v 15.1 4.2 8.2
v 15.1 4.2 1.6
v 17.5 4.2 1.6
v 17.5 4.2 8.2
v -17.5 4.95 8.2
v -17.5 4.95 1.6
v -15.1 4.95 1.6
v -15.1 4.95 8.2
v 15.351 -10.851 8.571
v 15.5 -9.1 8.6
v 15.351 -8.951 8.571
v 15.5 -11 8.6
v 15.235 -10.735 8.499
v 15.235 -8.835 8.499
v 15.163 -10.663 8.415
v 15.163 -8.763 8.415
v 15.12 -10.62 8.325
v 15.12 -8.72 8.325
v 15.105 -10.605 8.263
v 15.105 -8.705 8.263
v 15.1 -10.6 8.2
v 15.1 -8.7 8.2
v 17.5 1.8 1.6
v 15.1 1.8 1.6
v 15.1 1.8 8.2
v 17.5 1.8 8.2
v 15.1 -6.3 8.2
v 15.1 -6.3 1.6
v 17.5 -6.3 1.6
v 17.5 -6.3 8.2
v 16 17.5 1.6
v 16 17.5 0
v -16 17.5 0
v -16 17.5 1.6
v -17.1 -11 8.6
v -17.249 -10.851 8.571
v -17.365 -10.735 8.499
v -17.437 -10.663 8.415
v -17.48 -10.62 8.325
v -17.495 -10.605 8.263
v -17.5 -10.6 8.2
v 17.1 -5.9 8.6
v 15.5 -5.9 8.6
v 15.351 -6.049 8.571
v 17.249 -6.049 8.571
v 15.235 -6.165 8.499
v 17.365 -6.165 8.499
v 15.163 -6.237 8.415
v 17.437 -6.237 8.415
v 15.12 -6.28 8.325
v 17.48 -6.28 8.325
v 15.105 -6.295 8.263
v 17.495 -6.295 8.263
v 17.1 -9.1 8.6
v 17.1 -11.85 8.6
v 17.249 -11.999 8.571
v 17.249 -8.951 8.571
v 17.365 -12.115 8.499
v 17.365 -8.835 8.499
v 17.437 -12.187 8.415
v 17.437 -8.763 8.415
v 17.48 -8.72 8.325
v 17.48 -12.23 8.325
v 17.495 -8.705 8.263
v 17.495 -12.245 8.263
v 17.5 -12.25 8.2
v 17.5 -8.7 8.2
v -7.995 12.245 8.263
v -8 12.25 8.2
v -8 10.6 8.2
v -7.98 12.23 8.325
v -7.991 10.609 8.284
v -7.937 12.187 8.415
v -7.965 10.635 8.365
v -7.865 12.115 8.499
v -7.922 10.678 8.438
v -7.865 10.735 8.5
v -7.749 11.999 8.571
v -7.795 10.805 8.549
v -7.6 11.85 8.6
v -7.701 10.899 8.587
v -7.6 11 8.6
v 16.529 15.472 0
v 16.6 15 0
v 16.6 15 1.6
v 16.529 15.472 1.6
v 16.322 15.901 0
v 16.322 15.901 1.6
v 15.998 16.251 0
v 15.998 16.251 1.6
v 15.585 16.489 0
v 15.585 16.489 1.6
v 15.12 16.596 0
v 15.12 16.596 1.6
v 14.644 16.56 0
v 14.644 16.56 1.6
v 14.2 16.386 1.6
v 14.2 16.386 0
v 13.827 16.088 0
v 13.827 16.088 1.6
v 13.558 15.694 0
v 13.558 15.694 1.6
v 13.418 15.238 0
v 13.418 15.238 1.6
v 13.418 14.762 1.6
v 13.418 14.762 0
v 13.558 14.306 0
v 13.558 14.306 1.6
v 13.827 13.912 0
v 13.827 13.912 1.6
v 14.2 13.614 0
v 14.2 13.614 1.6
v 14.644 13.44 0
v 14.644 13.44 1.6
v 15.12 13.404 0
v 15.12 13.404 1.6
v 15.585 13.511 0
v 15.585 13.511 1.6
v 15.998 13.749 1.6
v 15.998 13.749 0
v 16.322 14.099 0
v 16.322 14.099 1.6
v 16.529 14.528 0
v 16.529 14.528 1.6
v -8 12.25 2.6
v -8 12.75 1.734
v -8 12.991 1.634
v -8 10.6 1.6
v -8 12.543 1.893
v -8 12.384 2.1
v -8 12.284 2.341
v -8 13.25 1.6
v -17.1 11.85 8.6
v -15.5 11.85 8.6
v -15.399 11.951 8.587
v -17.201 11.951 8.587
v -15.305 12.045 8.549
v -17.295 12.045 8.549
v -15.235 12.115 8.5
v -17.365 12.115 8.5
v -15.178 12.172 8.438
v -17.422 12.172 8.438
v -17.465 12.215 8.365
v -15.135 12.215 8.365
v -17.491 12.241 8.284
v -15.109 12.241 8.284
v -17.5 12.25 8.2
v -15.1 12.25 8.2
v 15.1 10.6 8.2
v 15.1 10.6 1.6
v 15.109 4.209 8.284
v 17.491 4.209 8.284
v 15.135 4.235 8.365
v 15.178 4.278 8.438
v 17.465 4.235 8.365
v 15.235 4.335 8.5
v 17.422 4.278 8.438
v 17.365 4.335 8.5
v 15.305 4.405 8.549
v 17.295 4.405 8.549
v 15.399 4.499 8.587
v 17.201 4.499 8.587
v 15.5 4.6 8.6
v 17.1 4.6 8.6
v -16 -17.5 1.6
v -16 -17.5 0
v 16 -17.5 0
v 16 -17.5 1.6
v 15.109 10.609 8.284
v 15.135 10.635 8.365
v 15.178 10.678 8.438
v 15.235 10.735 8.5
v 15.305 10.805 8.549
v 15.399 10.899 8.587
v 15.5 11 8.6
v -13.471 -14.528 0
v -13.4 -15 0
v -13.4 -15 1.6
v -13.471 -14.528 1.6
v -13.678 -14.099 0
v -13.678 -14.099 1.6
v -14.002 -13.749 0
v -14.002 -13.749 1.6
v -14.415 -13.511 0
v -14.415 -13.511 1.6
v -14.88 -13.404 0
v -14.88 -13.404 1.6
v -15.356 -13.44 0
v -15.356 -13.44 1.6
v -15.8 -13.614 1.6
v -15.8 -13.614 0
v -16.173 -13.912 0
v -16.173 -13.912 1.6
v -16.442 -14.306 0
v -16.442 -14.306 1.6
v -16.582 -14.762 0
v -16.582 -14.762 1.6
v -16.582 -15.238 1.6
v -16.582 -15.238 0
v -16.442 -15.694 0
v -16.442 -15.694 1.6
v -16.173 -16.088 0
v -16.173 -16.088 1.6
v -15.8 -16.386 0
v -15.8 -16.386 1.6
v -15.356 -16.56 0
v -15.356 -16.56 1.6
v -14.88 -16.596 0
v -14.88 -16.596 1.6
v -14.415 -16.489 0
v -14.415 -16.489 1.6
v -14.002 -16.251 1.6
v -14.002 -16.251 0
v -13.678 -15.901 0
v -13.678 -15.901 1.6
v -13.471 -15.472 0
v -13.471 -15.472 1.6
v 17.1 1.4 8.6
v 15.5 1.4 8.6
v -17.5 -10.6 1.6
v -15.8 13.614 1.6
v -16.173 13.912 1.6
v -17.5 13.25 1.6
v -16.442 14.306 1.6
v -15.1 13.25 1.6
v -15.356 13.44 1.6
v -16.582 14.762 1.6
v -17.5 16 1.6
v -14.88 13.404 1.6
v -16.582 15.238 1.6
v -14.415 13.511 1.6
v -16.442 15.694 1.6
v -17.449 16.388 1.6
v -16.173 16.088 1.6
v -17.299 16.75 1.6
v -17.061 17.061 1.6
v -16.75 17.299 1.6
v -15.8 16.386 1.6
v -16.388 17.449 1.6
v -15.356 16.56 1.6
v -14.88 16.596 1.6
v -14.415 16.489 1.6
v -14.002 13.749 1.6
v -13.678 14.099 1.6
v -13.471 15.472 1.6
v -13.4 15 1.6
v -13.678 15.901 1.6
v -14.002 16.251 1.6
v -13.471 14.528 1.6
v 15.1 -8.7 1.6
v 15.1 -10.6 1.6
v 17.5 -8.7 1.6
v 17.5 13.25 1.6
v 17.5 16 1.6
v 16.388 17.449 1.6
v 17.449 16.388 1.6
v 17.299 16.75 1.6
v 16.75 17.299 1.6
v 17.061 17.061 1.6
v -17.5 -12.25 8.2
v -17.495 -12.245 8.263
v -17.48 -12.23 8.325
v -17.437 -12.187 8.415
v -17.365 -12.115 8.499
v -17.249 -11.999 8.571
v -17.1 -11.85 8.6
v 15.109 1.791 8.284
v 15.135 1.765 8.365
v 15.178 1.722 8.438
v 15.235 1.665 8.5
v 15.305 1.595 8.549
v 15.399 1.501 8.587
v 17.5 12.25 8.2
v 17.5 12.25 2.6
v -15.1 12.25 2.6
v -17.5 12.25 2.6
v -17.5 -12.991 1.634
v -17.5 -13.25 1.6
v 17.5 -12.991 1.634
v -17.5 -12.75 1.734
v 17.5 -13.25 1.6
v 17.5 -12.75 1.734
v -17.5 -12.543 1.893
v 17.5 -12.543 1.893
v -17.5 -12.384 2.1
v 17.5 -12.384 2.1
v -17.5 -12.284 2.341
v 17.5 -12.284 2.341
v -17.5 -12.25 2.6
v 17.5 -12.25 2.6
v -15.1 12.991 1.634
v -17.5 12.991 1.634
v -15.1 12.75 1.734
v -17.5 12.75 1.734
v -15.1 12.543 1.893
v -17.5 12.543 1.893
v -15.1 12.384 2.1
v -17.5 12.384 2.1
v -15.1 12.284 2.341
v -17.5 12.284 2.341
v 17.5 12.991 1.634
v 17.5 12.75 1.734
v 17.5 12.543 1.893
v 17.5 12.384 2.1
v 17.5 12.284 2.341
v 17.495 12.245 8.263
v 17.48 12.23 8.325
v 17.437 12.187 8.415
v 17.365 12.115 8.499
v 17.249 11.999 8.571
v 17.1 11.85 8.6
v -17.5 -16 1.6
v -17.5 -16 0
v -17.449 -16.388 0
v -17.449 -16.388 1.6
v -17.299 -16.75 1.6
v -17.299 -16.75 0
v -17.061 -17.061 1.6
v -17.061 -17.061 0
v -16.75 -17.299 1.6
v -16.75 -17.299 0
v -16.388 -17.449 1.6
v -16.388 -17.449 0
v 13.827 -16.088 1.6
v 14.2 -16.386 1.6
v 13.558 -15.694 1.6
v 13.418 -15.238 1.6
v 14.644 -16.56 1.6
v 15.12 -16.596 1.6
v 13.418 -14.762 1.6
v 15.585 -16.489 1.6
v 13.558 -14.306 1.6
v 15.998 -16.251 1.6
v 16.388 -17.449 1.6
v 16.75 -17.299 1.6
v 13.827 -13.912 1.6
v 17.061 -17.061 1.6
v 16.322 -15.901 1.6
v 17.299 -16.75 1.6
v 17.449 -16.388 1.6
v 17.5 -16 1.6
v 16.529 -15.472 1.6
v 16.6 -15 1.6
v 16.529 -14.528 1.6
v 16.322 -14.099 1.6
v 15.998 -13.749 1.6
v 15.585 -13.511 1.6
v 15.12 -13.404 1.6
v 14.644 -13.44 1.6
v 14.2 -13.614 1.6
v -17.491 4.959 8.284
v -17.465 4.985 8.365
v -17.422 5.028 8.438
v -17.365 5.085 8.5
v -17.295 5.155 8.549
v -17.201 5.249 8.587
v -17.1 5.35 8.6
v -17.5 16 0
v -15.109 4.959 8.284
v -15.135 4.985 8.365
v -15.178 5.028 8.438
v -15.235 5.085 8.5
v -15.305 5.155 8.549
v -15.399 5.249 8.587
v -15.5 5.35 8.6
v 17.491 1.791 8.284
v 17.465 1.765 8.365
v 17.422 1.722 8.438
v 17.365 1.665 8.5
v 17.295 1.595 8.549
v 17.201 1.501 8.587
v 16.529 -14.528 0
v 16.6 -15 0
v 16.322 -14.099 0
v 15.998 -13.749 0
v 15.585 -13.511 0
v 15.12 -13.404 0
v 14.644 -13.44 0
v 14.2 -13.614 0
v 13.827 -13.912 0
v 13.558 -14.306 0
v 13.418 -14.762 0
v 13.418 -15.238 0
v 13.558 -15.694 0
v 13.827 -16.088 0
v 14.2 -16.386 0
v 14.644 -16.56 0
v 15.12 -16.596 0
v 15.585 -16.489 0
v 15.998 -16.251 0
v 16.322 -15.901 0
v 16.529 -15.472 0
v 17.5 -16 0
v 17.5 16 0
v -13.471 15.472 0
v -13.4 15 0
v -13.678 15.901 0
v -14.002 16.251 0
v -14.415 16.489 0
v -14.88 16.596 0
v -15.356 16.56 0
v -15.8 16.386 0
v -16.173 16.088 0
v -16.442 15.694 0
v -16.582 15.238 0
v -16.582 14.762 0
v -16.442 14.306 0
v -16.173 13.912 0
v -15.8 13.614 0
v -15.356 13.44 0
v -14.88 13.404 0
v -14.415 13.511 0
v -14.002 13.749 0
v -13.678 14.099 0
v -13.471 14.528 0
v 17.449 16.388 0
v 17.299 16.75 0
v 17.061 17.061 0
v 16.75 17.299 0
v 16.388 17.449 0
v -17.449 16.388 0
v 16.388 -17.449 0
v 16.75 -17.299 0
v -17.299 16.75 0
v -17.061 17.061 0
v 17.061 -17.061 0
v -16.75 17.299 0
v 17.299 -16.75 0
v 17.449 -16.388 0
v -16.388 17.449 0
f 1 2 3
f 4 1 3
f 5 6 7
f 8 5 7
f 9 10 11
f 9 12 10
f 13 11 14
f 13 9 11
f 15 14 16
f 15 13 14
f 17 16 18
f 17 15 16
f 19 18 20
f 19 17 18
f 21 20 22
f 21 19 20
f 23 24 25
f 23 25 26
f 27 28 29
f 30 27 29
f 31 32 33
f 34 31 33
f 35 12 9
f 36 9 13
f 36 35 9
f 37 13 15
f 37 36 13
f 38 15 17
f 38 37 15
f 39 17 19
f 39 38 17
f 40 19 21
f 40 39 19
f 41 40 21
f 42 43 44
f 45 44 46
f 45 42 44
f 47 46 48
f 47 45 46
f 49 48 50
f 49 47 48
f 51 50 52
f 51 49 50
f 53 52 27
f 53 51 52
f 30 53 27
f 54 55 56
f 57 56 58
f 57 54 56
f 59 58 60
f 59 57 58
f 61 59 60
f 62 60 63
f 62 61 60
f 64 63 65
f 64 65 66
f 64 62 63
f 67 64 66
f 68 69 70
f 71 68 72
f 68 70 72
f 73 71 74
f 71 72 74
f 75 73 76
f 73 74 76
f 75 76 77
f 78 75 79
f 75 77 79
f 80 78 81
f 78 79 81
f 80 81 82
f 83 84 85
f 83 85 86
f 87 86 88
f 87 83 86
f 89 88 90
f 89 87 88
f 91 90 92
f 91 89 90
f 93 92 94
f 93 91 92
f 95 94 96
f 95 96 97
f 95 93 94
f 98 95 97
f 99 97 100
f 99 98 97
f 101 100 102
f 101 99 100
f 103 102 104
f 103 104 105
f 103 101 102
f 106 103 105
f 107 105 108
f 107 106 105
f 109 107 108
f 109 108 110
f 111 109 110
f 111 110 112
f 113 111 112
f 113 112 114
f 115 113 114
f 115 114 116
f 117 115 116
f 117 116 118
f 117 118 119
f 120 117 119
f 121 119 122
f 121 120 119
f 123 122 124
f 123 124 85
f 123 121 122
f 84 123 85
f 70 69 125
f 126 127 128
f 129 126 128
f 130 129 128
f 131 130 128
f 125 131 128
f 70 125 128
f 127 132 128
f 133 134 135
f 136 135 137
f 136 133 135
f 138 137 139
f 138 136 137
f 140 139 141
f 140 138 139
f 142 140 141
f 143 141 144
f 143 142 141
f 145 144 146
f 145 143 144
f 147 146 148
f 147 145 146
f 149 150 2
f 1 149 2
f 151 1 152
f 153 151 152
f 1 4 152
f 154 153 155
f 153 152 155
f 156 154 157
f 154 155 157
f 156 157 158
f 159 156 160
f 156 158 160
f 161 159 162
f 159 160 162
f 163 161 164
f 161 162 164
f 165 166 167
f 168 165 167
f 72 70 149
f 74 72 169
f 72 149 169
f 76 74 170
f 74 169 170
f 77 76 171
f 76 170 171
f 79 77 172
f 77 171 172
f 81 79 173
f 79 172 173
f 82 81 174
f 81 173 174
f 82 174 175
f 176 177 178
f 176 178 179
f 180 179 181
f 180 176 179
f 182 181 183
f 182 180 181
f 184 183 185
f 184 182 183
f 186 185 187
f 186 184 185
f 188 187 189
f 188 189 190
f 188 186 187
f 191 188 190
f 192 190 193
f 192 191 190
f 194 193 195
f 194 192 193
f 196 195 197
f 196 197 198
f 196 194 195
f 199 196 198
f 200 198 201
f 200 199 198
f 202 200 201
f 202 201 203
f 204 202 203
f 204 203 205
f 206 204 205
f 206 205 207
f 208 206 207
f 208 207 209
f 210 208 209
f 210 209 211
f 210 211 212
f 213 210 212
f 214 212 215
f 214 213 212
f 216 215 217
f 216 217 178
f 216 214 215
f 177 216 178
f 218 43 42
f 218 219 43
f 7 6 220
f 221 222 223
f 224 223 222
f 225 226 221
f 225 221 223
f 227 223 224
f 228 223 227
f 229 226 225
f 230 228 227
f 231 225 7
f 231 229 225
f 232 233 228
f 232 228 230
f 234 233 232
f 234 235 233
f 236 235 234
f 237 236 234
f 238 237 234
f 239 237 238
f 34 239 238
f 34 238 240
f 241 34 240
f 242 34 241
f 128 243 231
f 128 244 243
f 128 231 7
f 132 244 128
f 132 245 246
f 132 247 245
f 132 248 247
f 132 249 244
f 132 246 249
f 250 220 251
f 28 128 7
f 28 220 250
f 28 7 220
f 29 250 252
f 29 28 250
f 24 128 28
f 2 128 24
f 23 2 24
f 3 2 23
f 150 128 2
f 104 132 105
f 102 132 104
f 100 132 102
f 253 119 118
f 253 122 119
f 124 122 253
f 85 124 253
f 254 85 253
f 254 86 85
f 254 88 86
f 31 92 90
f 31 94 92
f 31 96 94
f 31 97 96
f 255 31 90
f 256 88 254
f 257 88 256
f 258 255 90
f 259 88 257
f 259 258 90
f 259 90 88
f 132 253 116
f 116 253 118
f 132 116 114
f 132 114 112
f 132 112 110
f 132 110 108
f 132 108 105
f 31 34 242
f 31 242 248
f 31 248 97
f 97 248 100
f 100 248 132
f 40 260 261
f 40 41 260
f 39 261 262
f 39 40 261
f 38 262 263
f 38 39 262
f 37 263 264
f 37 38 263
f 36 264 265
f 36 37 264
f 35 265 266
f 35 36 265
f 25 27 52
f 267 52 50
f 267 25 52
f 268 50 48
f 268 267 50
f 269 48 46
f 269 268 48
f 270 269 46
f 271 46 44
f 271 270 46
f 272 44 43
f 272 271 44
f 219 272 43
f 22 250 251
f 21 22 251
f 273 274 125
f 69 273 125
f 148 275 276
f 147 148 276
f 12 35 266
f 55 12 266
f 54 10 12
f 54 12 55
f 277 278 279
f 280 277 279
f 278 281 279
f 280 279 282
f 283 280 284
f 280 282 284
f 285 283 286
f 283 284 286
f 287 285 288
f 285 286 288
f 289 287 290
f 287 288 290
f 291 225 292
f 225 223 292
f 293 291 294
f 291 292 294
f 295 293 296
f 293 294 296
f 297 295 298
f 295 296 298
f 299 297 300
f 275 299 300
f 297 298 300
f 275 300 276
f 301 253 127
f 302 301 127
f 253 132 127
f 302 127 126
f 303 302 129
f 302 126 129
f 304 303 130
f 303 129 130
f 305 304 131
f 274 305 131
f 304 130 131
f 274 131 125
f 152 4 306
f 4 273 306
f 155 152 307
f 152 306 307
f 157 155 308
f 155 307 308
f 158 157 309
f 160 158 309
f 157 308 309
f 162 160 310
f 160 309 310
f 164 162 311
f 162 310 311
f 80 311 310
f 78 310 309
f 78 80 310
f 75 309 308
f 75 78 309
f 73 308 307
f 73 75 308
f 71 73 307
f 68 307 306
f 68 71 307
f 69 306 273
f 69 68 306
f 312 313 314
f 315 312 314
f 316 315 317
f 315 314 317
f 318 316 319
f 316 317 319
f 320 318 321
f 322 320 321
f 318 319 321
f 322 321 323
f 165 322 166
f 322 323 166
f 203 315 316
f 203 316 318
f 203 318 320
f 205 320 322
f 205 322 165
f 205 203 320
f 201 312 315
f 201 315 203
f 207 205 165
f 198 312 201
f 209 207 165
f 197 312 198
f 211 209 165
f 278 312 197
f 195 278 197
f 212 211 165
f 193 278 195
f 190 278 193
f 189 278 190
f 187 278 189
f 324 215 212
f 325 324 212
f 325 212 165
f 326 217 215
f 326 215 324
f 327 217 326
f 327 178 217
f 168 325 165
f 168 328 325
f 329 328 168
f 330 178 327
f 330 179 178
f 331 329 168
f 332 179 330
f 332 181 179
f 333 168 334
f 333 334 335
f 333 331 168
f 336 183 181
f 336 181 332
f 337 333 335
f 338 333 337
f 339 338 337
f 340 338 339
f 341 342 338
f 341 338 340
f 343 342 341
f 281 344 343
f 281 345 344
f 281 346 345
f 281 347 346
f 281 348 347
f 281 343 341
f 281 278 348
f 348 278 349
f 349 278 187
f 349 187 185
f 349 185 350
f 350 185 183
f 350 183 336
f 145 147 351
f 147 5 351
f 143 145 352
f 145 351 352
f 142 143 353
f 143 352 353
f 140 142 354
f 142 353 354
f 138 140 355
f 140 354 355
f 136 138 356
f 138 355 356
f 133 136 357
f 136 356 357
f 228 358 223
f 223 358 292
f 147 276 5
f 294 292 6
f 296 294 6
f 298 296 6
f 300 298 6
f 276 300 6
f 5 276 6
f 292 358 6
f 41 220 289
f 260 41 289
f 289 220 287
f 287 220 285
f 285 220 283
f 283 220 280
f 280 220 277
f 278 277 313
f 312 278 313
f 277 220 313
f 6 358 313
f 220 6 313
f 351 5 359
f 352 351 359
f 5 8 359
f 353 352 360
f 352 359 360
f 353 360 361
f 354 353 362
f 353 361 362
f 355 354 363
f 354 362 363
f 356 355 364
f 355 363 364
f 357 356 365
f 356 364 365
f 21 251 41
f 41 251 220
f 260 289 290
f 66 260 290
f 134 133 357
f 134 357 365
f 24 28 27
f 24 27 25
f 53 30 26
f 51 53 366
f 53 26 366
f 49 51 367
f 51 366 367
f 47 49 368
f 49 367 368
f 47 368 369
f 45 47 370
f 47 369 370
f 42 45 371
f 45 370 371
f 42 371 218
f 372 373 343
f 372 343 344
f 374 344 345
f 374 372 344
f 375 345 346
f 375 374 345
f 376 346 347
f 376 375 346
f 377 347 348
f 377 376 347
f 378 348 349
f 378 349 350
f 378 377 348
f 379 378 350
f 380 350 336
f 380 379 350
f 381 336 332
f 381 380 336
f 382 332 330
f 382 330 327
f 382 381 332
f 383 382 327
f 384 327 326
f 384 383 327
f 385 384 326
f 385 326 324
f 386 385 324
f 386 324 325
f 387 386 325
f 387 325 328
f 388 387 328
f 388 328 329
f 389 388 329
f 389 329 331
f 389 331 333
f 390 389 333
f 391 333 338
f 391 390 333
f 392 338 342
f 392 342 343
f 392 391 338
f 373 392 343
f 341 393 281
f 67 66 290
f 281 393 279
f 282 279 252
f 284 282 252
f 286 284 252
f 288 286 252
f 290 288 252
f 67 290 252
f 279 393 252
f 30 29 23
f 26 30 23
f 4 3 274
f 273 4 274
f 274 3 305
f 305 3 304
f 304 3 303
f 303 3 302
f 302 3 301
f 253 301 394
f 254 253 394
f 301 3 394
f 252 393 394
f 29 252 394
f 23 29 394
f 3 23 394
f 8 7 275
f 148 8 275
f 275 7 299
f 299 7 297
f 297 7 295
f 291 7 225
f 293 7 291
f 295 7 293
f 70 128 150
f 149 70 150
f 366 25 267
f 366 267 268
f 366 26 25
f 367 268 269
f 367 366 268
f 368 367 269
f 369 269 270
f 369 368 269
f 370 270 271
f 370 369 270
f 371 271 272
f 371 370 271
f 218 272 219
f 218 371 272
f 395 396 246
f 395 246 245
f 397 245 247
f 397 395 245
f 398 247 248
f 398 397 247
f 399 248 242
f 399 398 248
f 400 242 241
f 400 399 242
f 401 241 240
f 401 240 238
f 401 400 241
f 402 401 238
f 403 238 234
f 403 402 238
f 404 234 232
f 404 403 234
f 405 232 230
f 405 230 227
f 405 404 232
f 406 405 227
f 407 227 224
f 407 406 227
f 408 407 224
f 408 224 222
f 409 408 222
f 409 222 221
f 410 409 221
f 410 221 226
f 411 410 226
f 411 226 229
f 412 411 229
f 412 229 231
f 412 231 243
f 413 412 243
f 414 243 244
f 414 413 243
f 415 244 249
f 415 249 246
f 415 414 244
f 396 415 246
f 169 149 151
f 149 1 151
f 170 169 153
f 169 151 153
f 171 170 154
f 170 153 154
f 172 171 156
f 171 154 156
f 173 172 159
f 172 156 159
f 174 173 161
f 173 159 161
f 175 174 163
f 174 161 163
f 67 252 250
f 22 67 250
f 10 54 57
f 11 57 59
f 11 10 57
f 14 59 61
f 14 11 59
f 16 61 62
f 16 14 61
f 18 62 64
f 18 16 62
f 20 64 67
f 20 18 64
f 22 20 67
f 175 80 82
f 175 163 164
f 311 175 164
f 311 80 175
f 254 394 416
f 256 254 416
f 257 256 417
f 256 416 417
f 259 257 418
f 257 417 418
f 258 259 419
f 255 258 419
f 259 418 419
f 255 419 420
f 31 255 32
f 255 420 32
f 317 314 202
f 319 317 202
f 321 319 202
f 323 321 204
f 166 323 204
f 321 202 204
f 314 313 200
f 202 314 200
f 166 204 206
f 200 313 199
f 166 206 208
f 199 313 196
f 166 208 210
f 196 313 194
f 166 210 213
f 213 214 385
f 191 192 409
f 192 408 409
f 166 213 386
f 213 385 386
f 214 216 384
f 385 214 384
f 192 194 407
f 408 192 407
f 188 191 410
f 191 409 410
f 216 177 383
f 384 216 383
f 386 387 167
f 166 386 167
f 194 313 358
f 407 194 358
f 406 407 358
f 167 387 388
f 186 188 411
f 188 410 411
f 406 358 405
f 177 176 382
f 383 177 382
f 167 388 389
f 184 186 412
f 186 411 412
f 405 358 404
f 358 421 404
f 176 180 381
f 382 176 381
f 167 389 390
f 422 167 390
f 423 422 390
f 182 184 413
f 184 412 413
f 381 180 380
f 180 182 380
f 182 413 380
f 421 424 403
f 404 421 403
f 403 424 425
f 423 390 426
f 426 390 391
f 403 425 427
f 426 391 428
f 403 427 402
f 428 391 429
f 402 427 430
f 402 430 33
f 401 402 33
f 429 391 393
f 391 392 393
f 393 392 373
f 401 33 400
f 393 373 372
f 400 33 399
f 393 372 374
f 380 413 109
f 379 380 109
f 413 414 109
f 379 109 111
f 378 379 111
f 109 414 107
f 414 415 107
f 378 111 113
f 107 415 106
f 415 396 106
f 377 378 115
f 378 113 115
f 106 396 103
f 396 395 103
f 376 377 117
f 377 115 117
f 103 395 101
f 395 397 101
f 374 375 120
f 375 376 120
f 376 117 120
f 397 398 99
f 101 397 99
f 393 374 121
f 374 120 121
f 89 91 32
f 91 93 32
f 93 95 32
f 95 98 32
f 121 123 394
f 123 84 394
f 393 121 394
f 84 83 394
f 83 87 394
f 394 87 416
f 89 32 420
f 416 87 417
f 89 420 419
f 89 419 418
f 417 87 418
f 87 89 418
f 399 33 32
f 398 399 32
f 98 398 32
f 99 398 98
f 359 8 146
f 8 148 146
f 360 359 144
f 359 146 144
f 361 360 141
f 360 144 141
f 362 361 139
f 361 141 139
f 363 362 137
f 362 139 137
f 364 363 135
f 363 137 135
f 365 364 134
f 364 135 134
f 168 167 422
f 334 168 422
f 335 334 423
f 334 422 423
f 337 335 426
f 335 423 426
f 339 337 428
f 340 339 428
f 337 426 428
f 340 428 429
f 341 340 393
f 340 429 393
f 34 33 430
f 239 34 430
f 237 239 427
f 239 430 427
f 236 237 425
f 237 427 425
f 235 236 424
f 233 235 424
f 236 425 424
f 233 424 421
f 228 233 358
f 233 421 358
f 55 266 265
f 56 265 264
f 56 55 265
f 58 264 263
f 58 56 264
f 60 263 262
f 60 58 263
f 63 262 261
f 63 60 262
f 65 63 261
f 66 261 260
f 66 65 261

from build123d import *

# Parameters (mm, degrees)
F0_R     = 1.6
F1_DEPTH = 1.6
F2_W     = 2.4
F2_H     = 8.1
F2_H_2   = 1.65
F3_DEPTH = 7
F4_R     = 1
F5_R     = 0.4


with BuildPart() as f1:
    # F0 (on Top) → F1 (new body)
    with BuildSketch(Plane.XY):
        with BuildLine():
            ThreePointArc((-17.5, -16), (-17.0606601718, -17.0606601718), (-16, -17.5))
            Line((-16, -17.5), (16, -17.5))
            ThreePointArc((16, -17.5), (17.0606601718, -17.0606601718), (17.5, -16))
            Line((17.5, -16), (17.5, 16))
            ThreePointArc((17.5, 16), (17.0606601718, 17.0606601718), (16, 17.5))
            Line((16, 17.5), (-16, 17.5))
            ThreePointArc((-16, 17.5), (-17.0606601718, 17.0606601718), (-17.5, 16))
            Line((-17.5, 16), (-17.5, -16))
        make_face()
        with Locations((-15, -15)):
            Circle(F0_R, mode=Mode.SUBTRACT)
        with Locations((15, -15)):
            Circle(F0_R, mode=Mode.SUBTRACT)
        with Locations((-15, 15)):
            Circle(F0_R, mode=Mode.SUBTRACT)
        with Locations((15, 15)):
            Circle(F0_R, mode=Mode.SUBTRACT)
    extrude(amount=F1_DEPTH)

    # F2 (on face) → F3 (join)
    with BuildSketch(Plane.XY.offset(1.6)):
        Polygon((15.1, -10.6), (-15.1, -10.6), (-15.1, -12.25), (17.5, -12.25), (17.5, -8.7), (15.1, -8.7), align=None)
        with Locations((16.3, -2.25)):
            Rectangle(F2_W, F2_H)
        Polygon((-8, 12.25), (-8, 10.6), (15.1, 10.6), (15.1, 4.2), (17.5, 4.2), (17.5, 12.25), align=None)
        Polygon((-17.5, 4.95), (-15.1, 4.95), (-15.1, 10.6), (-15.1, 12.25), (-17.5, 12.25), align=None)
        with Locations((-16.3, -11.425)):
            Rectangle(F2_W, F2_H_2)
    extrude(amount=F3_DEPTH)

    # F4
    f4_edges = [f1.edges().sort_by_distance(p)[0] for p in [
        (0, -12.25, 1.6),
        (4.75, 12.25, 1.6),
        (-16.3, 12.25, 1.6),
    ]]
    fillet(f4_edges, radius=F4_R)

    # F5
    f5_edges = [f1.edges().sort_by_distance(p)[0] for p in [
        (4.75, 12.25, 8.6),
        (3.55, 10.6, 8.6),
        (-15.1, 8.6, 8.6),
        (-17.5, 8.6, 8.6),
        (-16.3, 12.25, 8.6),
        (-8, 11.425, 8.6),
        (-16.3, 4.95, 8.6),
        (-1.2, -10.6, 8.6),
        (0, -12.25, 8.6),
        (16.3, -8.7, 8.6),
        (17.5, -10.475, 8.6),
        (15.1, -9.65, 8.6),
        (16.3, -6.3, 8.6),
        (15.1, -2.25, 8.6),
        (17.5, -2.25, 8.6),
        (16.3, 1.8, 8.6),
        (16.3, 4.2, 8.6),
        (15.1, 7.4, 8.6),
        (17.5, 8.225, 8.6),
        (-17.5, -11.425, 8.6),
    ]]
    fillet(f5_edges, radius=F5_R)


solid = f1.part
